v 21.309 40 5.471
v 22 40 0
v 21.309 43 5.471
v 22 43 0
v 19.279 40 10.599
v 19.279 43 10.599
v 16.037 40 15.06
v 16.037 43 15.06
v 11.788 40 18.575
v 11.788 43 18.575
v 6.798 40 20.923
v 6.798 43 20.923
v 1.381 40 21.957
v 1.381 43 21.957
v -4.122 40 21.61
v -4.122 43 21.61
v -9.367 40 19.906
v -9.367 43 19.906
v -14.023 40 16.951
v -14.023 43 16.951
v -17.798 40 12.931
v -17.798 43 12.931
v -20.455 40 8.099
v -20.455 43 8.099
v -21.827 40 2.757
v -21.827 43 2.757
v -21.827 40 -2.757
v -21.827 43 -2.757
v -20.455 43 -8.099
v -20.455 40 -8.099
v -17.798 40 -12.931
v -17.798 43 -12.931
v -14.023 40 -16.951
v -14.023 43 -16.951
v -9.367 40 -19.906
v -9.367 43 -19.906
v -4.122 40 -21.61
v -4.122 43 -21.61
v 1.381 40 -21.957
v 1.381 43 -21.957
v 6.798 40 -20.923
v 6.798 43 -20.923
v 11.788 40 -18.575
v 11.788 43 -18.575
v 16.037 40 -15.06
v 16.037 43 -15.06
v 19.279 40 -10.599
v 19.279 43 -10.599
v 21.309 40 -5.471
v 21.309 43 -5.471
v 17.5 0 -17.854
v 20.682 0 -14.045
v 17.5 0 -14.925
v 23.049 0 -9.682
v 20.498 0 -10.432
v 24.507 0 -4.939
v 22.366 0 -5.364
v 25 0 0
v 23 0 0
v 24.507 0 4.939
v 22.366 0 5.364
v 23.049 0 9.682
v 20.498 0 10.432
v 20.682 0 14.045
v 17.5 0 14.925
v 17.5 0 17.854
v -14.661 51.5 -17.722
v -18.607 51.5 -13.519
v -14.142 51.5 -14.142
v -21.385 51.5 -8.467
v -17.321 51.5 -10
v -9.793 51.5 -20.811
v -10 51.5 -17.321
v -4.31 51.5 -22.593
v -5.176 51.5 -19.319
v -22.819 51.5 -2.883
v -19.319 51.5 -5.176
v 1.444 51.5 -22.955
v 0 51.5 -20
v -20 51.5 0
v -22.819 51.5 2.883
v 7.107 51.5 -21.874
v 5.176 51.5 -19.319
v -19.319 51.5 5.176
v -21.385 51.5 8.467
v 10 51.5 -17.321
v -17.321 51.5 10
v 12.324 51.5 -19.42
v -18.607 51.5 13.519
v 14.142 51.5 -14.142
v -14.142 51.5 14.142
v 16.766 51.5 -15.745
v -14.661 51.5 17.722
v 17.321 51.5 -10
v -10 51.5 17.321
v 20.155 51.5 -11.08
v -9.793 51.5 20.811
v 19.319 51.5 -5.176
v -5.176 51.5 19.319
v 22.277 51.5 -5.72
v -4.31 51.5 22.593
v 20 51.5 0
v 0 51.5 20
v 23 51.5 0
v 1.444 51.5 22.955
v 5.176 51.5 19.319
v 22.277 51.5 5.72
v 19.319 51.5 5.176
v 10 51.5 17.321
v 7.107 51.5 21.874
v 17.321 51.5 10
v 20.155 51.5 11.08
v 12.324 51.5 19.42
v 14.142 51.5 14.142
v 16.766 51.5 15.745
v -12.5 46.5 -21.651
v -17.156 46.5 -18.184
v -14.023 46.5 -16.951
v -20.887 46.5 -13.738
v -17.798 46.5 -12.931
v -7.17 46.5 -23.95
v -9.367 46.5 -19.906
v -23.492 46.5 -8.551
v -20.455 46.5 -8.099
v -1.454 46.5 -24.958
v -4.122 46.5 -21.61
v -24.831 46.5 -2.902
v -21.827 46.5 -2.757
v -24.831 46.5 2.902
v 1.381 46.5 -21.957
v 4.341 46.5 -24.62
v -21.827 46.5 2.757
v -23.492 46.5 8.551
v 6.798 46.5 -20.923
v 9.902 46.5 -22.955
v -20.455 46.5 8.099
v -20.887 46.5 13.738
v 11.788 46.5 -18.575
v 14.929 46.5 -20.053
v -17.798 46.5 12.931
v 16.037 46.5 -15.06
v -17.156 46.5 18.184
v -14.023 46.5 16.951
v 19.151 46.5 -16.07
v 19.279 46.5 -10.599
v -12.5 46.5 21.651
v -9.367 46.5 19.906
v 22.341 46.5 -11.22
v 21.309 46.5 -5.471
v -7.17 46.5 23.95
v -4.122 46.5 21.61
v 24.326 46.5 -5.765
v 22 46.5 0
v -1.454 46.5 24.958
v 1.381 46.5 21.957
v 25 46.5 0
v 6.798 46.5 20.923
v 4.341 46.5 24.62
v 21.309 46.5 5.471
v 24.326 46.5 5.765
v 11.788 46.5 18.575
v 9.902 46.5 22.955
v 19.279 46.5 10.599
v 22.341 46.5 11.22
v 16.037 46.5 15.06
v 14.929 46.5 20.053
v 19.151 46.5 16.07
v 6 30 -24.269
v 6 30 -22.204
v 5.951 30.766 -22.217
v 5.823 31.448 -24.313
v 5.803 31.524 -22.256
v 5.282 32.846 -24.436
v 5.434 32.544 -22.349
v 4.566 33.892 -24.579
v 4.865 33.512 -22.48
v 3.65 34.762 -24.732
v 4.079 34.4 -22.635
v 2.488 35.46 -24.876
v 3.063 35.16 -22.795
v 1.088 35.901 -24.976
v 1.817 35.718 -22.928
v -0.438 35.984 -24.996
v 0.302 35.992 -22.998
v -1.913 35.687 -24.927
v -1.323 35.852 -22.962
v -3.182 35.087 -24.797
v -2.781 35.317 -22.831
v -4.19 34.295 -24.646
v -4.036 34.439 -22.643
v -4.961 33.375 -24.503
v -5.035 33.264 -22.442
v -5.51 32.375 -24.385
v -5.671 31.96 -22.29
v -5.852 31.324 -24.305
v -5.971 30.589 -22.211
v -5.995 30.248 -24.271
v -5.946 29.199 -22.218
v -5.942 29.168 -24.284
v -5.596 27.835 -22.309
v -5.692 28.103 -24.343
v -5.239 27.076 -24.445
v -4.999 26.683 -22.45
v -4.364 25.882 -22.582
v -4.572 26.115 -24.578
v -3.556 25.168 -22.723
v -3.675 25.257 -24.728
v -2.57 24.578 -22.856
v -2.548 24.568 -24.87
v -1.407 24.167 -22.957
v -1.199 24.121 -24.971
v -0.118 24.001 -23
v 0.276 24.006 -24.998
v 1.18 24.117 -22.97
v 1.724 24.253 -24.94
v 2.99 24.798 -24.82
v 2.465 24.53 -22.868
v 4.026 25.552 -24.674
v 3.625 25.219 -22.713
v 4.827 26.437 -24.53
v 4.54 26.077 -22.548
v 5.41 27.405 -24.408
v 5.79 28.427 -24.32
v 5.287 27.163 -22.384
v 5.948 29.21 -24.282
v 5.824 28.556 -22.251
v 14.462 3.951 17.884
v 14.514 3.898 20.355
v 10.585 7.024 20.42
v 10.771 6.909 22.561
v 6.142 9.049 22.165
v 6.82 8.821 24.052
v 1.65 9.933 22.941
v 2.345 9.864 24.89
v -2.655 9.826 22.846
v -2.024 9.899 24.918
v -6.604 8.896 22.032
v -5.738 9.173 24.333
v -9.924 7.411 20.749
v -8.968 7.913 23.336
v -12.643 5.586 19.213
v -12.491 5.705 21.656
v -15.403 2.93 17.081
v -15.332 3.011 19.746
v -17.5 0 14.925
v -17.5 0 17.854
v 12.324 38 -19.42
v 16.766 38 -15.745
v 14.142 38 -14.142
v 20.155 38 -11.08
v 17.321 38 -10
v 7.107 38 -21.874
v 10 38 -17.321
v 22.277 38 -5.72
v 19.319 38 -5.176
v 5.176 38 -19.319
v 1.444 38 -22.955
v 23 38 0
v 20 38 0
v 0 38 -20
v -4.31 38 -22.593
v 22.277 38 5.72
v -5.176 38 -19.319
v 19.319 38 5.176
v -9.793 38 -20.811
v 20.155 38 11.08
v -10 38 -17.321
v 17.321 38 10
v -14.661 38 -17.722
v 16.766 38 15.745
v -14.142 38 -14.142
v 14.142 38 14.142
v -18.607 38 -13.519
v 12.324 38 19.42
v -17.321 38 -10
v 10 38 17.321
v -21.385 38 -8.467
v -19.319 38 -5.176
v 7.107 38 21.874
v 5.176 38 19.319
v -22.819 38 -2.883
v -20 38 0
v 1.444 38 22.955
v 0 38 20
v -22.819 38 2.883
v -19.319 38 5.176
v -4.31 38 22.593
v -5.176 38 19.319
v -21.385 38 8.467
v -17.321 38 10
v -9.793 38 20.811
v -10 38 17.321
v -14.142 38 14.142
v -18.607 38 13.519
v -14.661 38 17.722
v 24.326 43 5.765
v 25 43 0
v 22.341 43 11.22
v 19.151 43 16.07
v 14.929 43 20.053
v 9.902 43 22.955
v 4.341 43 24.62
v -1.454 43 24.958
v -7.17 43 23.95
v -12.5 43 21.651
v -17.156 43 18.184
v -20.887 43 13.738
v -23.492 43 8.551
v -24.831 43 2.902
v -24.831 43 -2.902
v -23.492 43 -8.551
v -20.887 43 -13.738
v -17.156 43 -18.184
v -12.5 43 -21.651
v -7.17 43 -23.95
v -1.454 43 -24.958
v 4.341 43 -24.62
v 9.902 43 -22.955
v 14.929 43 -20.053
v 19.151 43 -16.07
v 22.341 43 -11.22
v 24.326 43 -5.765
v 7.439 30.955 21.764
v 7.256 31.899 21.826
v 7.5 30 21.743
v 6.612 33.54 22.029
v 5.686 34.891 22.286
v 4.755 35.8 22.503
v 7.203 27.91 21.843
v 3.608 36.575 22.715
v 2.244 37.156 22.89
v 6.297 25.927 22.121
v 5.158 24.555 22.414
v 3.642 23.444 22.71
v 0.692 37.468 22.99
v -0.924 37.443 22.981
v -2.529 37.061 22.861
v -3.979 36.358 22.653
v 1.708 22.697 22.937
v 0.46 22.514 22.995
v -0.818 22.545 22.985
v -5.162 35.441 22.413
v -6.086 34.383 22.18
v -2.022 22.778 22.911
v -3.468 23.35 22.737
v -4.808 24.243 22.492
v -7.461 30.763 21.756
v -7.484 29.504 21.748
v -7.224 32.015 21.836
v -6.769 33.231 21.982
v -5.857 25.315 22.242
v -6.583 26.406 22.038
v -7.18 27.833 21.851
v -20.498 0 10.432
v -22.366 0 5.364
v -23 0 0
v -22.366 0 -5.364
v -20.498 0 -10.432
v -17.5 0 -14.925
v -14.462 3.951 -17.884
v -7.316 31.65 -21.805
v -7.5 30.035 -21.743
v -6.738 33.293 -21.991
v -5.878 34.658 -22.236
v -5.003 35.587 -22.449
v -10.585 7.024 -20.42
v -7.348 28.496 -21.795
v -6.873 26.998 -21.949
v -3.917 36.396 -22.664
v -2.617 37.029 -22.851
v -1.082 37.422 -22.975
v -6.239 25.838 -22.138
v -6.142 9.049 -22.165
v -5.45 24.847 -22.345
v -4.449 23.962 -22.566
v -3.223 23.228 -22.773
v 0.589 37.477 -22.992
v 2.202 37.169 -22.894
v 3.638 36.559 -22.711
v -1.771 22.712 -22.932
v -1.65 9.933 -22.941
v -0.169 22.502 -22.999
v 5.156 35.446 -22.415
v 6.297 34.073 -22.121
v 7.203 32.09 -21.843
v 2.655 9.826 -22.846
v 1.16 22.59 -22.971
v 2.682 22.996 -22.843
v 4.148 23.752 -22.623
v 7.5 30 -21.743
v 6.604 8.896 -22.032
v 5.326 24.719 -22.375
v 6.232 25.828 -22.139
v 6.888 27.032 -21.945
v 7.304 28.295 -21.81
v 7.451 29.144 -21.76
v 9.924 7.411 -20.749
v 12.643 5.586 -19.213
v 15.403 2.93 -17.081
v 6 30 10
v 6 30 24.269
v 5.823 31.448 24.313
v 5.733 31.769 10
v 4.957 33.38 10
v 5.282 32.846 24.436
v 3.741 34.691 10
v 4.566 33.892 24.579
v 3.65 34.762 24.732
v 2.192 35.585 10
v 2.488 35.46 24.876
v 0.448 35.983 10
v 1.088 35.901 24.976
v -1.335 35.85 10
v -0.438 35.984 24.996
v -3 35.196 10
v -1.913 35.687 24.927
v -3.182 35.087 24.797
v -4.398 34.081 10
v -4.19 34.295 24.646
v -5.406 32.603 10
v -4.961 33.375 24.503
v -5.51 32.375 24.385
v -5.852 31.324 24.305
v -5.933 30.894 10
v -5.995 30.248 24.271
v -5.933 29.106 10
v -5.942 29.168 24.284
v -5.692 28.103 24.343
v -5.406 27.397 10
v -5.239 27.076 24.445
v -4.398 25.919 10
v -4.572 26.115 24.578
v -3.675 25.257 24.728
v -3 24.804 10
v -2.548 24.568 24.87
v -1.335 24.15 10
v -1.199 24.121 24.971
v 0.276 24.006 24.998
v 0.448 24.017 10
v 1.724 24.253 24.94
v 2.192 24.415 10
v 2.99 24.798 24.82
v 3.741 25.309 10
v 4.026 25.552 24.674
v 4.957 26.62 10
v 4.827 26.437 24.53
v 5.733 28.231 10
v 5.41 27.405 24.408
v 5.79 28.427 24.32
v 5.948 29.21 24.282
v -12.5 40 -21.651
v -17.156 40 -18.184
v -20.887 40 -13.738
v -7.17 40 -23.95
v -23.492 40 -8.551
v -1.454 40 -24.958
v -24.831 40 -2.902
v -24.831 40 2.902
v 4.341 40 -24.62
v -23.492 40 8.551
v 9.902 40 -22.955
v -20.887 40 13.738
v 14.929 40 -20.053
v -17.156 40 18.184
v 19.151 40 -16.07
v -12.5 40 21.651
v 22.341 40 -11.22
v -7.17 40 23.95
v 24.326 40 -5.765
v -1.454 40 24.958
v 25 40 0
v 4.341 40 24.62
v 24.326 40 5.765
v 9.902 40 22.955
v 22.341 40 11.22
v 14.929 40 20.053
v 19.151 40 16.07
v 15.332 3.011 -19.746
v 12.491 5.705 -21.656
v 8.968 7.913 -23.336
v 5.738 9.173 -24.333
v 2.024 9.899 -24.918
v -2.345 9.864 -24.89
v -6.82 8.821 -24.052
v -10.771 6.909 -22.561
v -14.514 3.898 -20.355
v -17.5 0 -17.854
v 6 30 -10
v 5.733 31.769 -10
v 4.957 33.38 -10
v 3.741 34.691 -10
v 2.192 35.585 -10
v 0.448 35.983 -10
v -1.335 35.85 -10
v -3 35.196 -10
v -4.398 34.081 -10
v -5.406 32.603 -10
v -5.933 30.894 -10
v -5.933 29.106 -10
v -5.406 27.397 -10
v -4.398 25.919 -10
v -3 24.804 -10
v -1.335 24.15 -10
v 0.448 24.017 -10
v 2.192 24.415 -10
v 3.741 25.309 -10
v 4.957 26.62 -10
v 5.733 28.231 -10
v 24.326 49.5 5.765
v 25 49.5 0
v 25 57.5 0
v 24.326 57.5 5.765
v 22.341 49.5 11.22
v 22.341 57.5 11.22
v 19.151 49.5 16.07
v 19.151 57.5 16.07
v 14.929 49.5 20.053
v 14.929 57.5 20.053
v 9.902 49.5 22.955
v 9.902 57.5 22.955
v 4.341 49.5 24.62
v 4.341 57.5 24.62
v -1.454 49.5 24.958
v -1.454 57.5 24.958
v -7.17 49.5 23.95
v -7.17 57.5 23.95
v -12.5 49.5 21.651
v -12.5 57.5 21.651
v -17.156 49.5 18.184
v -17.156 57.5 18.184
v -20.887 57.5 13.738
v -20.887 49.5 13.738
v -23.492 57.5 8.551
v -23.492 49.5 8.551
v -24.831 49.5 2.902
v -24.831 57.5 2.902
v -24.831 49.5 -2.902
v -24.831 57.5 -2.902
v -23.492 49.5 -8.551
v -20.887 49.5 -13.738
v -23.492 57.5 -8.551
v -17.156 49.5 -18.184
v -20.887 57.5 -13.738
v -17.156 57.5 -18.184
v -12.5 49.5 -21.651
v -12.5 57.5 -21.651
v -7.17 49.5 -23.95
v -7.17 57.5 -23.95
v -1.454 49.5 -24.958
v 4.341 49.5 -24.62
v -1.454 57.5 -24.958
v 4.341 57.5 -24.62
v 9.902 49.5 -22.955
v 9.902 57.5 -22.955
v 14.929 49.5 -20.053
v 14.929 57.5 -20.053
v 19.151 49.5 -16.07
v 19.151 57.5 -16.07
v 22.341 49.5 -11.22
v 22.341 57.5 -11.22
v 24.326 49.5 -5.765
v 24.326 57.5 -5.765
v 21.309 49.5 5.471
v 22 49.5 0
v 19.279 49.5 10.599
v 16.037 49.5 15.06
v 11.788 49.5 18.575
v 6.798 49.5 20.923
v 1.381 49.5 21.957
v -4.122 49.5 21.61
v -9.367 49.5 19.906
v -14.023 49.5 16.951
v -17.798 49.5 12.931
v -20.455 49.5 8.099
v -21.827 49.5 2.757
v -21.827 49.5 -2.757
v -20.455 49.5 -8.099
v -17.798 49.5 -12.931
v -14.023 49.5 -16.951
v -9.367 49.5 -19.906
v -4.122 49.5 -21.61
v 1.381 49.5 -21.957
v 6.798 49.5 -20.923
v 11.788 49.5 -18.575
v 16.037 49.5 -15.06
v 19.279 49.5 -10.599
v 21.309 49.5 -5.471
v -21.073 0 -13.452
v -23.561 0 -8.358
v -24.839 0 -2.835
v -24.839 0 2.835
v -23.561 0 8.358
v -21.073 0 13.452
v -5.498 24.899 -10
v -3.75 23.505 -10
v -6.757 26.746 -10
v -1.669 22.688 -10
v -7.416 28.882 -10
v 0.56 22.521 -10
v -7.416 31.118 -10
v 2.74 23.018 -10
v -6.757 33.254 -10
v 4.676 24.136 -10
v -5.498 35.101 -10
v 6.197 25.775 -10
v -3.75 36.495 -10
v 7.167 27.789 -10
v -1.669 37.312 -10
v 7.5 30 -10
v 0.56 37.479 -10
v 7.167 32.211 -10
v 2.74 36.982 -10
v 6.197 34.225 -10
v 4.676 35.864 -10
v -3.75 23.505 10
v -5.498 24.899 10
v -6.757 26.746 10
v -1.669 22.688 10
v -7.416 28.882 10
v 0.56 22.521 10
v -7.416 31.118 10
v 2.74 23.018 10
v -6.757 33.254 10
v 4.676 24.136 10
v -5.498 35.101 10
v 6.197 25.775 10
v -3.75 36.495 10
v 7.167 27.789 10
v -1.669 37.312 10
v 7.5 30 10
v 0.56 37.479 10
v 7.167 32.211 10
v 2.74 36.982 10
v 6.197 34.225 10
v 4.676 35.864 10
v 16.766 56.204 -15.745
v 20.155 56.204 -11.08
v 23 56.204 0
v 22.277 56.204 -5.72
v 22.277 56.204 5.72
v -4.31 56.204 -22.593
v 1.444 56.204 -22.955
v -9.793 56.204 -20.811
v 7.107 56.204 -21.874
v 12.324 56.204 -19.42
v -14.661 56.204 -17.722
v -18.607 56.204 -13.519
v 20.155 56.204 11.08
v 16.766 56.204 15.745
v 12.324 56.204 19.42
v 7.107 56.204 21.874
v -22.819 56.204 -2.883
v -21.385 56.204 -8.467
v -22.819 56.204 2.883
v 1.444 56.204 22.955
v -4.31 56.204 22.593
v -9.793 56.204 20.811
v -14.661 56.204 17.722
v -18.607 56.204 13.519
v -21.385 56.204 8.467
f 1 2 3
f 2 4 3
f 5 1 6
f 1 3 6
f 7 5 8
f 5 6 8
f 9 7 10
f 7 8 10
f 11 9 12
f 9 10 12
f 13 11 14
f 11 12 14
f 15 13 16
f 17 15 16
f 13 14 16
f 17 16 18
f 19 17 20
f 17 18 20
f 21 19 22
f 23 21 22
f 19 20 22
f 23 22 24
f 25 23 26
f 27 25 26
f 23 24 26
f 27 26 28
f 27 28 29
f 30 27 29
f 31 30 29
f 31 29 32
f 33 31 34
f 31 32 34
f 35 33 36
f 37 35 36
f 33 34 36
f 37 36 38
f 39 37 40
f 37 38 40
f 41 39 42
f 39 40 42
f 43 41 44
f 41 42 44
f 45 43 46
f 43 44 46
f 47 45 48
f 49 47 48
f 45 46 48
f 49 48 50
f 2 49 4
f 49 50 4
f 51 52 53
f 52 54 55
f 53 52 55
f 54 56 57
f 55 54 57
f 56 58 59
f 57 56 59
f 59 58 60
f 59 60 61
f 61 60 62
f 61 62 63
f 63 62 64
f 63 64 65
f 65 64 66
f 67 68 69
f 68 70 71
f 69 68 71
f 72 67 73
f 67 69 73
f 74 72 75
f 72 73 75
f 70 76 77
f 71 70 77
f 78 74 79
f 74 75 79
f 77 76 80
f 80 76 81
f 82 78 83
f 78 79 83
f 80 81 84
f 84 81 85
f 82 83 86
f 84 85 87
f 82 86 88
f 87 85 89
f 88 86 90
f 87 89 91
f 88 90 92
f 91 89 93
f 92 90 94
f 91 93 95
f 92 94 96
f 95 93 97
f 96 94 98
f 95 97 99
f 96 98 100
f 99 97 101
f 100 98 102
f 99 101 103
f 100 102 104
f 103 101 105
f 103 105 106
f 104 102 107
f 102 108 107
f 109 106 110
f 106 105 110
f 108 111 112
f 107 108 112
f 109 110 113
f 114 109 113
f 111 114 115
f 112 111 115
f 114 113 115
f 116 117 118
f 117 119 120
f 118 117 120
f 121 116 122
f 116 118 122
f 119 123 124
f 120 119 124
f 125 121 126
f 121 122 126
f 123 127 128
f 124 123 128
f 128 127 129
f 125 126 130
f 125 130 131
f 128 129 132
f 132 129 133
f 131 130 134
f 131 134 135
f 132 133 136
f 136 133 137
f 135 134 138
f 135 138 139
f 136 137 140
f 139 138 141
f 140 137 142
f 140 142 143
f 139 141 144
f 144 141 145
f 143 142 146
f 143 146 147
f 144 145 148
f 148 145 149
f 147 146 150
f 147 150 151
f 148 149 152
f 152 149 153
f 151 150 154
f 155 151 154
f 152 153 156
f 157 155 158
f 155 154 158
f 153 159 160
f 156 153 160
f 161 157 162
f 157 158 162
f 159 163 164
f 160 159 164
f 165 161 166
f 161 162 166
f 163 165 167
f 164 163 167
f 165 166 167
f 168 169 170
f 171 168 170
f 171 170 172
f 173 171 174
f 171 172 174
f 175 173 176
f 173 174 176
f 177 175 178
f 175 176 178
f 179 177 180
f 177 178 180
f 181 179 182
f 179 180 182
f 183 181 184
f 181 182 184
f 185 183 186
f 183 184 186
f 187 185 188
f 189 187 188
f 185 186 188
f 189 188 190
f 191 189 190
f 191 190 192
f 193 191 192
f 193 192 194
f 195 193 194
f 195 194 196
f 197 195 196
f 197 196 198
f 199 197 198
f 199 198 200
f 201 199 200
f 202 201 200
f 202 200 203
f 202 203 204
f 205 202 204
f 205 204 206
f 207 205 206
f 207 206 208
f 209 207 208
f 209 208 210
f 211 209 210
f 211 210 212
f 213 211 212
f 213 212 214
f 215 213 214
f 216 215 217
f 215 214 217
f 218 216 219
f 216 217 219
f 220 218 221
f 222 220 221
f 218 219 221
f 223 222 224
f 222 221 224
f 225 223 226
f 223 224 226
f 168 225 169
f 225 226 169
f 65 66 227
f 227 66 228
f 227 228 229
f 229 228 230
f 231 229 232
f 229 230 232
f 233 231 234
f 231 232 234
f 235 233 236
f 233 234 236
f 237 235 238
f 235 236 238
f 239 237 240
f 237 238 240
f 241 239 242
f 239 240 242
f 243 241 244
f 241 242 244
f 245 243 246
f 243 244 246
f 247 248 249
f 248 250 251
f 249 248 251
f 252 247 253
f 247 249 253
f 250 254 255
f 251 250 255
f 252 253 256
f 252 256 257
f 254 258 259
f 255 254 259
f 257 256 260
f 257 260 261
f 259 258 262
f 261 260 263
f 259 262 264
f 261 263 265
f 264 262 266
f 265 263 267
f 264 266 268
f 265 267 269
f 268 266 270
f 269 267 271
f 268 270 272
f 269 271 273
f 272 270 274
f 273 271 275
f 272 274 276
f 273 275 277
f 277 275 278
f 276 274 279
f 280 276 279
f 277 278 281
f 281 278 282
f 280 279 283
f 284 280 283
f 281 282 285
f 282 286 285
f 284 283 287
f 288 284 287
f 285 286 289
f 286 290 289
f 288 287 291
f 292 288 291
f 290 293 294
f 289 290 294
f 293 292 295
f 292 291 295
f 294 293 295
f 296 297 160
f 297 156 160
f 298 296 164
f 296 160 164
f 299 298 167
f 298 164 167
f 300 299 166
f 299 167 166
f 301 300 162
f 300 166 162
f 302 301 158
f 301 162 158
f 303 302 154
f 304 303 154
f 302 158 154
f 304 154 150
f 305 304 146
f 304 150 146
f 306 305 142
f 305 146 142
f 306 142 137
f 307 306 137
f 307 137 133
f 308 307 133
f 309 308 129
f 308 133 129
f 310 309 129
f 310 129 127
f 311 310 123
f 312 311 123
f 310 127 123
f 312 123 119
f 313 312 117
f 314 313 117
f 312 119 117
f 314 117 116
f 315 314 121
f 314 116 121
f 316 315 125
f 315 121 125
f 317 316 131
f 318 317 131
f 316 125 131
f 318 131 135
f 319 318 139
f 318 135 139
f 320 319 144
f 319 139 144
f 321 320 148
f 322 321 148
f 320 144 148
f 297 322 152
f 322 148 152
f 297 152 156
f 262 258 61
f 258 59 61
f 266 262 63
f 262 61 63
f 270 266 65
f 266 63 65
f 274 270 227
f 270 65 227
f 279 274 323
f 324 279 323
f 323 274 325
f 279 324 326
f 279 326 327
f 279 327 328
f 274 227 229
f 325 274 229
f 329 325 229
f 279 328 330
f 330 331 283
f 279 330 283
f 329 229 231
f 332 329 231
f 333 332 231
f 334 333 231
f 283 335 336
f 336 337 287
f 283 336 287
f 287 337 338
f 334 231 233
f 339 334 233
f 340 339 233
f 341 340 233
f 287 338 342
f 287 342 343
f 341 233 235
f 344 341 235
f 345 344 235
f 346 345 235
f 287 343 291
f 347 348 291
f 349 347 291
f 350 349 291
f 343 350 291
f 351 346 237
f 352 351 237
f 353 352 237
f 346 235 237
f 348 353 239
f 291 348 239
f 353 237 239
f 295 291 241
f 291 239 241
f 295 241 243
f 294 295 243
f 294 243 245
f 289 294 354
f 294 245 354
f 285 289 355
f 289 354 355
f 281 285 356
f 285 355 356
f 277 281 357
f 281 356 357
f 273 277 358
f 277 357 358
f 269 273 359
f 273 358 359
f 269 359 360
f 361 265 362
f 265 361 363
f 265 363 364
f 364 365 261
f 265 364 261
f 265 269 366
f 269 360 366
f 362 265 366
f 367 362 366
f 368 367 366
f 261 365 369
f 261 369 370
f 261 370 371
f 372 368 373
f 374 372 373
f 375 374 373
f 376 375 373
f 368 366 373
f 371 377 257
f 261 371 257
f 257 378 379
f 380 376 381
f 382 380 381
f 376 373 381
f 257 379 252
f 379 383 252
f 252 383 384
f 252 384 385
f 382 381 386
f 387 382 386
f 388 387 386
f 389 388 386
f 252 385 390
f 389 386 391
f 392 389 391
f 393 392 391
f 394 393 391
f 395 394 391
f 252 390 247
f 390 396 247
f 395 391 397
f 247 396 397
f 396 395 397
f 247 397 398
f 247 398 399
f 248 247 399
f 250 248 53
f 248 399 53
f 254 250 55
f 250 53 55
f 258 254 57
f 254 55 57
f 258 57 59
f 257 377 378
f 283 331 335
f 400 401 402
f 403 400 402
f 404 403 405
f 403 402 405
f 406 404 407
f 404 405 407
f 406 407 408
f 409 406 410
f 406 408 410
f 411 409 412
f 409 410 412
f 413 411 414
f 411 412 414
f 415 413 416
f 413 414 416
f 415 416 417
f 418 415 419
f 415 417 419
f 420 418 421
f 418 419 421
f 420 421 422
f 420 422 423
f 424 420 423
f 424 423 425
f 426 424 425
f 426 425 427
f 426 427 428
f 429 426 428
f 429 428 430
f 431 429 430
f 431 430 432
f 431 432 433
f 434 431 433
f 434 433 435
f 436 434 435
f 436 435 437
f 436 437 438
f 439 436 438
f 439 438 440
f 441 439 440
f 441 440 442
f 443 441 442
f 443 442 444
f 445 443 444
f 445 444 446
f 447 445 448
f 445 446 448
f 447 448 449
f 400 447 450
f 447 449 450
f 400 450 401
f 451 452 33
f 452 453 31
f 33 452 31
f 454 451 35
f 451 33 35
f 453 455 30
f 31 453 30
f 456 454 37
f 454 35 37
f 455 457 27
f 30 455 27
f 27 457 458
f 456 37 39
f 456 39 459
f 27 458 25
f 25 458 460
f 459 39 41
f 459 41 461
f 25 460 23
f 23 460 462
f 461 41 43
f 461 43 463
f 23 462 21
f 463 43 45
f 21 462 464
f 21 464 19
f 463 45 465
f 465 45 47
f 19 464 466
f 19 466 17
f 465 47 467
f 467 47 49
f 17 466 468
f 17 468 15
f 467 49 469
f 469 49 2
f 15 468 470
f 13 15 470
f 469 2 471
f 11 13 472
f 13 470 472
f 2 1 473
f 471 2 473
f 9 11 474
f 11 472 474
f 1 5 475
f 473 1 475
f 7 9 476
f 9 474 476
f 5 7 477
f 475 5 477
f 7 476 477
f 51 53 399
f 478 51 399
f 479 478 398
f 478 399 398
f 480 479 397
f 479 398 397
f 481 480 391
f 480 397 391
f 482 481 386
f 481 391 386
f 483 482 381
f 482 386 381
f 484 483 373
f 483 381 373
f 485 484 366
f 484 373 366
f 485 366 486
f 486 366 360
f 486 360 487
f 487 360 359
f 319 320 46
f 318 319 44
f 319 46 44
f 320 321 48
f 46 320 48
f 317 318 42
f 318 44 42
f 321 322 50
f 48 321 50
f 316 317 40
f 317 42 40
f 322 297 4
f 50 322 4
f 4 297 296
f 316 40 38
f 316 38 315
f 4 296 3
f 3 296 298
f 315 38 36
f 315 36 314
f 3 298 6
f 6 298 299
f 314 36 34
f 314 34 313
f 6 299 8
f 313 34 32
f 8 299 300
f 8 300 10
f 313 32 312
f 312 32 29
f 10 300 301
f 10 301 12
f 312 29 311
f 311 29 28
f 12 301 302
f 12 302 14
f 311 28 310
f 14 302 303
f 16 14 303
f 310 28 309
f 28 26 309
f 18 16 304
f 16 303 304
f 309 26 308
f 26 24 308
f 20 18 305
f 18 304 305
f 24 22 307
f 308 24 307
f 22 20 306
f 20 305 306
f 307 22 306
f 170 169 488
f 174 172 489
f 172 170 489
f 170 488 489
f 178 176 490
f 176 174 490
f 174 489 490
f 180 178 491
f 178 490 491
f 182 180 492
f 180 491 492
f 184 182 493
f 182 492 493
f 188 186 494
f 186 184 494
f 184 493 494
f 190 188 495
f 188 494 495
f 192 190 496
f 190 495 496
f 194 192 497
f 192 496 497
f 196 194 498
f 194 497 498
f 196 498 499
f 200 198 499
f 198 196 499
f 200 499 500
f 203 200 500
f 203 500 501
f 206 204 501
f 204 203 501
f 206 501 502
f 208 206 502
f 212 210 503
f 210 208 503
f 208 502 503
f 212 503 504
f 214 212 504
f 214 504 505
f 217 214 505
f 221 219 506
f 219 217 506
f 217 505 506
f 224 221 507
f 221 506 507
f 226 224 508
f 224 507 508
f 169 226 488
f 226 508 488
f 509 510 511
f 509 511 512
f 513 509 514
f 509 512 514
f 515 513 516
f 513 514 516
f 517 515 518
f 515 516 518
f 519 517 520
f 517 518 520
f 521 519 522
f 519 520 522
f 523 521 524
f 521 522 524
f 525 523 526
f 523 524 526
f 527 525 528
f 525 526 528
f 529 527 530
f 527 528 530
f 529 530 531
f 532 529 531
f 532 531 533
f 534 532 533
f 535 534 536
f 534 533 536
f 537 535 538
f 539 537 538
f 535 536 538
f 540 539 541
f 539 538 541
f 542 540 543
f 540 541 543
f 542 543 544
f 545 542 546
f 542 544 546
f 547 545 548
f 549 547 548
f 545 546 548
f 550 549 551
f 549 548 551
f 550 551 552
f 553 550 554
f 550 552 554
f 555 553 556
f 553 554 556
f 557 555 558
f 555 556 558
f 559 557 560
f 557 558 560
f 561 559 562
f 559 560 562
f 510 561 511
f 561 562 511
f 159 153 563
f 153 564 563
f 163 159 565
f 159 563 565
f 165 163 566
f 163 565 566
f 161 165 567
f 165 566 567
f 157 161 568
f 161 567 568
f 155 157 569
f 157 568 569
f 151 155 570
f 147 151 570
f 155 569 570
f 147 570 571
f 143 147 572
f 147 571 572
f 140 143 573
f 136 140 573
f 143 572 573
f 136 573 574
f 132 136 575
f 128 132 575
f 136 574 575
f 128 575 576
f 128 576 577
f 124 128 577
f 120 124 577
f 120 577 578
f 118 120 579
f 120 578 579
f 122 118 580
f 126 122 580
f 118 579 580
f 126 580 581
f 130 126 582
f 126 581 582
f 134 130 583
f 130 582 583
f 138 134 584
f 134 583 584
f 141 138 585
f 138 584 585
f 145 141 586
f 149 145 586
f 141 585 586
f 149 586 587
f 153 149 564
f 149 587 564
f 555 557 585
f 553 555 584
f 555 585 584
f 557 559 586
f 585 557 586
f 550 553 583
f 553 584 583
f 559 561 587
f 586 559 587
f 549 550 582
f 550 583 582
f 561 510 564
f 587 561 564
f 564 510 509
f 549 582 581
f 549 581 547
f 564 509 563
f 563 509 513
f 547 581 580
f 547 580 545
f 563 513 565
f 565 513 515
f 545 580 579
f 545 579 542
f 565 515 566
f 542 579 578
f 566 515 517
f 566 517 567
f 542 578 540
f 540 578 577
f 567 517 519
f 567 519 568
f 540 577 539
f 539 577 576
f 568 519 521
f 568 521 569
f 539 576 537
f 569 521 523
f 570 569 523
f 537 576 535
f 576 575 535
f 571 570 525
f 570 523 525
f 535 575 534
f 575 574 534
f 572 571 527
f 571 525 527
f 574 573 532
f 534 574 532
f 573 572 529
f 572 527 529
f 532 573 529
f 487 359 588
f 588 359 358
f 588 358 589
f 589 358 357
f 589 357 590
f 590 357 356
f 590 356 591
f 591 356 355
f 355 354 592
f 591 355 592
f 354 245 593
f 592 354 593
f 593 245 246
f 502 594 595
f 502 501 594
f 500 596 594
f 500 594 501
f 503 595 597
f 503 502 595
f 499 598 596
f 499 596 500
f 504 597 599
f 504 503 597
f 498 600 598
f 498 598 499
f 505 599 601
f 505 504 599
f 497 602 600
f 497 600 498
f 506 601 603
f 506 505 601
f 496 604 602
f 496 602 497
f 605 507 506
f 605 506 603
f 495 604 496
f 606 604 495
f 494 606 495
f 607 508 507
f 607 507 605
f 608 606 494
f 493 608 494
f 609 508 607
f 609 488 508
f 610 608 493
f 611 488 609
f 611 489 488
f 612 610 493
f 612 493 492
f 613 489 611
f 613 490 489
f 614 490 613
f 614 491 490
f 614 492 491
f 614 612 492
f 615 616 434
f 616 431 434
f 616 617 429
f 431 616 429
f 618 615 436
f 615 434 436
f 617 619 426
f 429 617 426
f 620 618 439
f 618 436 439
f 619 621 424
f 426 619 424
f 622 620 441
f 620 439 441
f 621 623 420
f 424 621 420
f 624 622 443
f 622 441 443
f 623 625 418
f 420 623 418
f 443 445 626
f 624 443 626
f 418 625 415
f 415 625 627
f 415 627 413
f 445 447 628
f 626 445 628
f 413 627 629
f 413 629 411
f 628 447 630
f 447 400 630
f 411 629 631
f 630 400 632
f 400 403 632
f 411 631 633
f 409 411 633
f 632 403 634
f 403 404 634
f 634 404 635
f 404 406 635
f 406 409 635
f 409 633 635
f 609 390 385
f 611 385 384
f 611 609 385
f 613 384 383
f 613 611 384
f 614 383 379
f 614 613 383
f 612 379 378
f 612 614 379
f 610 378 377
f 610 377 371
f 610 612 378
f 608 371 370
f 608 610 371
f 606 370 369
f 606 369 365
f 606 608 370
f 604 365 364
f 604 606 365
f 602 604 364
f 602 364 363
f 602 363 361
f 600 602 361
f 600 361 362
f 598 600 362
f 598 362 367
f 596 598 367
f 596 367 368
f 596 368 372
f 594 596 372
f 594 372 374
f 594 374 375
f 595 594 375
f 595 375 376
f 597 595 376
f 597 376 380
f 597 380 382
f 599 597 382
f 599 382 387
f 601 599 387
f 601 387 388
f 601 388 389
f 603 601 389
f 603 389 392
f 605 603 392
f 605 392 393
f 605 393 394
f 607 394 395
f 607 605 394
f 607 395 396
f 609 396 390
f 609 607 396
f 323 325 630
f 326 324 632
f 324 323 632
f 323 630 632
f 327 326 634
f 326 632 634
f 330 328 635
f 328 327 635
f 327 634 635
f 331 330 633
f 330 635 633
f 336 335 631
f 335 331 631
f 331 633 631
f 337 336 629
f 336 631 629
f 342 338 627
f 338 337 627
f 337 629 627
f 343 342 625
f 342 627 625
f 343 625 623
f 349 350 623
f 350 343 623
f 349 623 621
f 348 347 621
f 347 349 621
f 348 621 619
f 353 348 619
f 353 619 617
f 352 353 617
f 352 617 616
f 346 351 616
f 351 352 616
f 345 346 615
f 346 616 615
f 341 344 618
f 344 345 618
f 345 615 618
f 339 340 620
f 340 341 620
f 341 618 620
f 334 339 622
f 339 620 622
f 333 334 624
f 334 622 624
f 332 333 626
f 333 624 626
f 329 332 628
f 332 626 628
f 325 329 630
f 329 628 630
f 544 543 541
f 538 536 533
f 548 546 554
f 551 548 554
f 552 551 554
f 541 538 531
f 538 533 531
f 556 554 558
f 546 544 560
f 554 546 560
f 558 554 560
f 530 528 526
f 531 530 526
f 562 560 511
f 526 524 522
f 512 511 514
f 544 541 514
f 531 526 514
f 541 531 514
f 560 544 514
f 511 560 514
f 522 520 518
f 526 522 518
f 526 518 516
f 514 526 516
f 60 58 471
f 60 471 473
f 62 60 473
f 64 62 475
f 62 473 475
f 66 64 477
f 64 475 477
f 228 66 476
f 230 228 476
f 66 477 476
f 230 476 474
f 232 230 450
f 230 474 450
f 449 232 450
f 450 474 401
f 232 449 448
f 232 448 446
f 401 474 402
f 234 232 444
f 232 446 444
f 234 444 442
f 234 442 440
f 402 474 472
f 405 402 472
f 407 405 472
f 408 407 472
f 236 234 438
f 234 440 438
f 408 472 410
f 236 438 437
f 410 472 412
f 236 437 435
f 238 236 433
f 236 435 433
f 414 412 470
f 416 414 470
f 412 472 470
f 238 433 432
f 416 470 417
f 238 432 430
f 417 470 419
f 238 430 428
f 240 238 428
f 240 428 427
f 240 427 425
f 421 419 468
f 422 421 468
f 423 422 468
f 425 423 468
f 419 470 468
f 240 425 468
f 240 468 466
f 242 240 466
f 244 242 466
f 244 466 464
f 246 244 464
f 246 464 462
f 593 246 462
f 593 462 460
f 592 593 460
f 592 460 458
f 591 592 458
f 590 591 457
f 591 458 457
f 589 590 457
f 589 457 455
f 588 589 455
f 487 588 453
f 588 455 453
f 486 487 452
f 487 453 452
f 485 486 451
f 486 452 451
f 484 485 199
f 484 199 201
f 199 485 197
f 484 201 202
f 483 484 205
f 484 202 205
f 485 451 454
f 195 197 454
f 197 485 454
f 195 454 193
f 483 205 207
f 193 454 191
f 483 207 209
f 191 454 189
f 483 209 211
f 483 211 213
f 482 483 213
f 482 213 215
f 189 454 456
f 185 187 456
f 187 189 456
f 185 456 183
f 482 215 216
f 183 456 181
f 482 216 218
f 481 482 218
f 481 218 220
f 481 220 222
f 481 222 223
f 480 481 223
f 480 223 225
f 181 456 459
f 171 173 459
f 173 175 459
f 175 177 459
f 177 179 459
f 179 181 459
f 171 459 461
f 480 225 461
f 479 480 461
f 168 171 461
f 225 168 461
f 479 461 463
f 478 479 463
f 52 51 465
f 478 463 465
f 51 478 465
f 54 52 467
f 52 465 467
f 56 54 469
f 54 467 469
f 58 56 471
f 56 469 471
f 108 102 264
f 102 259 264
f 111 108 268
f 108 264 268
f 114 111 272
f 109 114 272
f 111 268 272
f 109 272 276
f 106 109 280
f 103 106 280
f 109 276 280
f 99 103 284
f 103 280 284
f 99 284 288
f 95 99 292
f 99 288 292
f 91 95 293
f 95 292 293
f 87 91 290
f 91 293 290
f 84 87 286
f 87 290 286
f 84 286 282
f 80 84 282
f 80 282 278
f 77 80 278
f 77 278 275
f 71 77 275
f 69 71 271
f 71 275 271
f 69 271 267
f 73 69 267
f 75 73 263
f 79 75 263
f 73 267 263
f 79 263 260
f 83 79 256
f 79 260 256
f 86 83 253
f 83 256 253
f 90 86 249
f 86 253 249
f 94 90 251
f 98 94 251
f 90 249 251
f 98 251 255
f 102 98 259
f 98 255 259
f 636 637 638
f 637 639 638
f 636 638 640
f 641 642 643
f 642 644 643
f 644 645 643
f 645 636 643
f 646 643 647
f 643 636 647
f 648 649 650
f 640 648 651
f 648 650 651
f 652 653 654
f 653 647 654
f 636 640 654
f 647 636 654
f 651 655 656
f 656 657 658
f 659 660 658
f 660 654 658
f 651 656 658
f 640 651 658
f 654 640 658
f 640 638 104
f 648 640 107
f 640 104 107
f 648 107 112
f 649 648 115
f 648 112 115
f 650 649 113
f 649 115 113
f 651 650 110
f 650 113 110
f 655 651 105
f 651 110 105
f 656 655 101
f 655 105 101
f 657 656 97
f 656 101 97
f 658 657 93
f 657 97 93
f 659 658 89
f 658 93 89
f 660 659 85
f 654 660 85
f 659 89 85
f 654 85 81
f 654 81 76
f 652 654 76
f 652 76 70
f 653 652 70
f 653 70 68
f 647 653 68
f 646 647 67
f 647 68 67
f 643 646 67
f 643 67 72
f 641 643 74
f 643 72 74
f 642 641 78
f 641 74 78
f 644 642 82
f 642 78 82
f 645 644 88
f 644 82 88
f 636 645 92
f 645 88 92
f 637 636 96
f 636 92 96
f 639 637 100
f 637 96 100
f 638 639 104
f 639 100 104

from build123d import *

# Parameters (mm, degrees)
CUT_EXTRUDE1_DEPTH  = 31.5
SKETCH3_R           = 6
CUT_EXTRUDE2_DEPTH  = 31.5
SKETCH4_R           = 7.5
SKETCH4_R_2         = 6
BOSS_EXTRUDE1_DEPTH = 13


with BuildPart() as part:
    # Sketch1 → Revolve1 (revolve)
    with BuildSketch(Plane.XY):
        Polygon((23, 0), (25, 0), (25, 40), (22, 40), (22, 43), (25, 43), (25, 46.5), (22, 46.5), (22, 49.5), (25, 49.5), (25, 57.5), (0, 57.5), (0, 56.203662834), (23, 56.203662834), (23, 51.5), (20, 51.5), (20, 44.75), (20, 38), (23, 38), align=None)
    revolve(axis=Axis((0, 63, 0), (0, -1, 0)))

    # Sketch2 → Cut-Extrude1 (cut, symmetric)
    with BuildSketch(Plane.XY):
        with BuildLine():
            Line((-17.5, 0), (17.5, 0))
            ThreePointArc((17.5, 0), (0, 10), (-17.5, 0))
        make_face()
    extrude(amount=CUT_EXTRUDE1_DEPTH, both=True, mode=Mode.SUBTRACT)

    # Sketch3 → Cut-Extrude2 (cut, symmetric)
    with BuildSketch(Plane.XY):
        with Locations((0, 30)):
            Circle(SKETCH3_R)
    extrude(amount=CUT_EXTRUDE2_DEPTH, both=True, mode=Mode.SUBTRACT)

    # Sketch4 → Boss-Extrude1 (add)
    with BuildSketch(Plane.XY.offset(10)):
        with Locations((0, 30)):
            Circle(SKETCH4_R)
        with Locations((0, 30)):
            Circle(SKETCH4_R_2, mode=Mode.SUBTRACT)
    boss_extrude1 = extrude(amount=BOSS_EXTRUDE1_DEPTH)

    # Mirror1: Boss-Extrude1 across plane
    add(boss_extrude1.mirror(Plane.XY))


solid = part.part
